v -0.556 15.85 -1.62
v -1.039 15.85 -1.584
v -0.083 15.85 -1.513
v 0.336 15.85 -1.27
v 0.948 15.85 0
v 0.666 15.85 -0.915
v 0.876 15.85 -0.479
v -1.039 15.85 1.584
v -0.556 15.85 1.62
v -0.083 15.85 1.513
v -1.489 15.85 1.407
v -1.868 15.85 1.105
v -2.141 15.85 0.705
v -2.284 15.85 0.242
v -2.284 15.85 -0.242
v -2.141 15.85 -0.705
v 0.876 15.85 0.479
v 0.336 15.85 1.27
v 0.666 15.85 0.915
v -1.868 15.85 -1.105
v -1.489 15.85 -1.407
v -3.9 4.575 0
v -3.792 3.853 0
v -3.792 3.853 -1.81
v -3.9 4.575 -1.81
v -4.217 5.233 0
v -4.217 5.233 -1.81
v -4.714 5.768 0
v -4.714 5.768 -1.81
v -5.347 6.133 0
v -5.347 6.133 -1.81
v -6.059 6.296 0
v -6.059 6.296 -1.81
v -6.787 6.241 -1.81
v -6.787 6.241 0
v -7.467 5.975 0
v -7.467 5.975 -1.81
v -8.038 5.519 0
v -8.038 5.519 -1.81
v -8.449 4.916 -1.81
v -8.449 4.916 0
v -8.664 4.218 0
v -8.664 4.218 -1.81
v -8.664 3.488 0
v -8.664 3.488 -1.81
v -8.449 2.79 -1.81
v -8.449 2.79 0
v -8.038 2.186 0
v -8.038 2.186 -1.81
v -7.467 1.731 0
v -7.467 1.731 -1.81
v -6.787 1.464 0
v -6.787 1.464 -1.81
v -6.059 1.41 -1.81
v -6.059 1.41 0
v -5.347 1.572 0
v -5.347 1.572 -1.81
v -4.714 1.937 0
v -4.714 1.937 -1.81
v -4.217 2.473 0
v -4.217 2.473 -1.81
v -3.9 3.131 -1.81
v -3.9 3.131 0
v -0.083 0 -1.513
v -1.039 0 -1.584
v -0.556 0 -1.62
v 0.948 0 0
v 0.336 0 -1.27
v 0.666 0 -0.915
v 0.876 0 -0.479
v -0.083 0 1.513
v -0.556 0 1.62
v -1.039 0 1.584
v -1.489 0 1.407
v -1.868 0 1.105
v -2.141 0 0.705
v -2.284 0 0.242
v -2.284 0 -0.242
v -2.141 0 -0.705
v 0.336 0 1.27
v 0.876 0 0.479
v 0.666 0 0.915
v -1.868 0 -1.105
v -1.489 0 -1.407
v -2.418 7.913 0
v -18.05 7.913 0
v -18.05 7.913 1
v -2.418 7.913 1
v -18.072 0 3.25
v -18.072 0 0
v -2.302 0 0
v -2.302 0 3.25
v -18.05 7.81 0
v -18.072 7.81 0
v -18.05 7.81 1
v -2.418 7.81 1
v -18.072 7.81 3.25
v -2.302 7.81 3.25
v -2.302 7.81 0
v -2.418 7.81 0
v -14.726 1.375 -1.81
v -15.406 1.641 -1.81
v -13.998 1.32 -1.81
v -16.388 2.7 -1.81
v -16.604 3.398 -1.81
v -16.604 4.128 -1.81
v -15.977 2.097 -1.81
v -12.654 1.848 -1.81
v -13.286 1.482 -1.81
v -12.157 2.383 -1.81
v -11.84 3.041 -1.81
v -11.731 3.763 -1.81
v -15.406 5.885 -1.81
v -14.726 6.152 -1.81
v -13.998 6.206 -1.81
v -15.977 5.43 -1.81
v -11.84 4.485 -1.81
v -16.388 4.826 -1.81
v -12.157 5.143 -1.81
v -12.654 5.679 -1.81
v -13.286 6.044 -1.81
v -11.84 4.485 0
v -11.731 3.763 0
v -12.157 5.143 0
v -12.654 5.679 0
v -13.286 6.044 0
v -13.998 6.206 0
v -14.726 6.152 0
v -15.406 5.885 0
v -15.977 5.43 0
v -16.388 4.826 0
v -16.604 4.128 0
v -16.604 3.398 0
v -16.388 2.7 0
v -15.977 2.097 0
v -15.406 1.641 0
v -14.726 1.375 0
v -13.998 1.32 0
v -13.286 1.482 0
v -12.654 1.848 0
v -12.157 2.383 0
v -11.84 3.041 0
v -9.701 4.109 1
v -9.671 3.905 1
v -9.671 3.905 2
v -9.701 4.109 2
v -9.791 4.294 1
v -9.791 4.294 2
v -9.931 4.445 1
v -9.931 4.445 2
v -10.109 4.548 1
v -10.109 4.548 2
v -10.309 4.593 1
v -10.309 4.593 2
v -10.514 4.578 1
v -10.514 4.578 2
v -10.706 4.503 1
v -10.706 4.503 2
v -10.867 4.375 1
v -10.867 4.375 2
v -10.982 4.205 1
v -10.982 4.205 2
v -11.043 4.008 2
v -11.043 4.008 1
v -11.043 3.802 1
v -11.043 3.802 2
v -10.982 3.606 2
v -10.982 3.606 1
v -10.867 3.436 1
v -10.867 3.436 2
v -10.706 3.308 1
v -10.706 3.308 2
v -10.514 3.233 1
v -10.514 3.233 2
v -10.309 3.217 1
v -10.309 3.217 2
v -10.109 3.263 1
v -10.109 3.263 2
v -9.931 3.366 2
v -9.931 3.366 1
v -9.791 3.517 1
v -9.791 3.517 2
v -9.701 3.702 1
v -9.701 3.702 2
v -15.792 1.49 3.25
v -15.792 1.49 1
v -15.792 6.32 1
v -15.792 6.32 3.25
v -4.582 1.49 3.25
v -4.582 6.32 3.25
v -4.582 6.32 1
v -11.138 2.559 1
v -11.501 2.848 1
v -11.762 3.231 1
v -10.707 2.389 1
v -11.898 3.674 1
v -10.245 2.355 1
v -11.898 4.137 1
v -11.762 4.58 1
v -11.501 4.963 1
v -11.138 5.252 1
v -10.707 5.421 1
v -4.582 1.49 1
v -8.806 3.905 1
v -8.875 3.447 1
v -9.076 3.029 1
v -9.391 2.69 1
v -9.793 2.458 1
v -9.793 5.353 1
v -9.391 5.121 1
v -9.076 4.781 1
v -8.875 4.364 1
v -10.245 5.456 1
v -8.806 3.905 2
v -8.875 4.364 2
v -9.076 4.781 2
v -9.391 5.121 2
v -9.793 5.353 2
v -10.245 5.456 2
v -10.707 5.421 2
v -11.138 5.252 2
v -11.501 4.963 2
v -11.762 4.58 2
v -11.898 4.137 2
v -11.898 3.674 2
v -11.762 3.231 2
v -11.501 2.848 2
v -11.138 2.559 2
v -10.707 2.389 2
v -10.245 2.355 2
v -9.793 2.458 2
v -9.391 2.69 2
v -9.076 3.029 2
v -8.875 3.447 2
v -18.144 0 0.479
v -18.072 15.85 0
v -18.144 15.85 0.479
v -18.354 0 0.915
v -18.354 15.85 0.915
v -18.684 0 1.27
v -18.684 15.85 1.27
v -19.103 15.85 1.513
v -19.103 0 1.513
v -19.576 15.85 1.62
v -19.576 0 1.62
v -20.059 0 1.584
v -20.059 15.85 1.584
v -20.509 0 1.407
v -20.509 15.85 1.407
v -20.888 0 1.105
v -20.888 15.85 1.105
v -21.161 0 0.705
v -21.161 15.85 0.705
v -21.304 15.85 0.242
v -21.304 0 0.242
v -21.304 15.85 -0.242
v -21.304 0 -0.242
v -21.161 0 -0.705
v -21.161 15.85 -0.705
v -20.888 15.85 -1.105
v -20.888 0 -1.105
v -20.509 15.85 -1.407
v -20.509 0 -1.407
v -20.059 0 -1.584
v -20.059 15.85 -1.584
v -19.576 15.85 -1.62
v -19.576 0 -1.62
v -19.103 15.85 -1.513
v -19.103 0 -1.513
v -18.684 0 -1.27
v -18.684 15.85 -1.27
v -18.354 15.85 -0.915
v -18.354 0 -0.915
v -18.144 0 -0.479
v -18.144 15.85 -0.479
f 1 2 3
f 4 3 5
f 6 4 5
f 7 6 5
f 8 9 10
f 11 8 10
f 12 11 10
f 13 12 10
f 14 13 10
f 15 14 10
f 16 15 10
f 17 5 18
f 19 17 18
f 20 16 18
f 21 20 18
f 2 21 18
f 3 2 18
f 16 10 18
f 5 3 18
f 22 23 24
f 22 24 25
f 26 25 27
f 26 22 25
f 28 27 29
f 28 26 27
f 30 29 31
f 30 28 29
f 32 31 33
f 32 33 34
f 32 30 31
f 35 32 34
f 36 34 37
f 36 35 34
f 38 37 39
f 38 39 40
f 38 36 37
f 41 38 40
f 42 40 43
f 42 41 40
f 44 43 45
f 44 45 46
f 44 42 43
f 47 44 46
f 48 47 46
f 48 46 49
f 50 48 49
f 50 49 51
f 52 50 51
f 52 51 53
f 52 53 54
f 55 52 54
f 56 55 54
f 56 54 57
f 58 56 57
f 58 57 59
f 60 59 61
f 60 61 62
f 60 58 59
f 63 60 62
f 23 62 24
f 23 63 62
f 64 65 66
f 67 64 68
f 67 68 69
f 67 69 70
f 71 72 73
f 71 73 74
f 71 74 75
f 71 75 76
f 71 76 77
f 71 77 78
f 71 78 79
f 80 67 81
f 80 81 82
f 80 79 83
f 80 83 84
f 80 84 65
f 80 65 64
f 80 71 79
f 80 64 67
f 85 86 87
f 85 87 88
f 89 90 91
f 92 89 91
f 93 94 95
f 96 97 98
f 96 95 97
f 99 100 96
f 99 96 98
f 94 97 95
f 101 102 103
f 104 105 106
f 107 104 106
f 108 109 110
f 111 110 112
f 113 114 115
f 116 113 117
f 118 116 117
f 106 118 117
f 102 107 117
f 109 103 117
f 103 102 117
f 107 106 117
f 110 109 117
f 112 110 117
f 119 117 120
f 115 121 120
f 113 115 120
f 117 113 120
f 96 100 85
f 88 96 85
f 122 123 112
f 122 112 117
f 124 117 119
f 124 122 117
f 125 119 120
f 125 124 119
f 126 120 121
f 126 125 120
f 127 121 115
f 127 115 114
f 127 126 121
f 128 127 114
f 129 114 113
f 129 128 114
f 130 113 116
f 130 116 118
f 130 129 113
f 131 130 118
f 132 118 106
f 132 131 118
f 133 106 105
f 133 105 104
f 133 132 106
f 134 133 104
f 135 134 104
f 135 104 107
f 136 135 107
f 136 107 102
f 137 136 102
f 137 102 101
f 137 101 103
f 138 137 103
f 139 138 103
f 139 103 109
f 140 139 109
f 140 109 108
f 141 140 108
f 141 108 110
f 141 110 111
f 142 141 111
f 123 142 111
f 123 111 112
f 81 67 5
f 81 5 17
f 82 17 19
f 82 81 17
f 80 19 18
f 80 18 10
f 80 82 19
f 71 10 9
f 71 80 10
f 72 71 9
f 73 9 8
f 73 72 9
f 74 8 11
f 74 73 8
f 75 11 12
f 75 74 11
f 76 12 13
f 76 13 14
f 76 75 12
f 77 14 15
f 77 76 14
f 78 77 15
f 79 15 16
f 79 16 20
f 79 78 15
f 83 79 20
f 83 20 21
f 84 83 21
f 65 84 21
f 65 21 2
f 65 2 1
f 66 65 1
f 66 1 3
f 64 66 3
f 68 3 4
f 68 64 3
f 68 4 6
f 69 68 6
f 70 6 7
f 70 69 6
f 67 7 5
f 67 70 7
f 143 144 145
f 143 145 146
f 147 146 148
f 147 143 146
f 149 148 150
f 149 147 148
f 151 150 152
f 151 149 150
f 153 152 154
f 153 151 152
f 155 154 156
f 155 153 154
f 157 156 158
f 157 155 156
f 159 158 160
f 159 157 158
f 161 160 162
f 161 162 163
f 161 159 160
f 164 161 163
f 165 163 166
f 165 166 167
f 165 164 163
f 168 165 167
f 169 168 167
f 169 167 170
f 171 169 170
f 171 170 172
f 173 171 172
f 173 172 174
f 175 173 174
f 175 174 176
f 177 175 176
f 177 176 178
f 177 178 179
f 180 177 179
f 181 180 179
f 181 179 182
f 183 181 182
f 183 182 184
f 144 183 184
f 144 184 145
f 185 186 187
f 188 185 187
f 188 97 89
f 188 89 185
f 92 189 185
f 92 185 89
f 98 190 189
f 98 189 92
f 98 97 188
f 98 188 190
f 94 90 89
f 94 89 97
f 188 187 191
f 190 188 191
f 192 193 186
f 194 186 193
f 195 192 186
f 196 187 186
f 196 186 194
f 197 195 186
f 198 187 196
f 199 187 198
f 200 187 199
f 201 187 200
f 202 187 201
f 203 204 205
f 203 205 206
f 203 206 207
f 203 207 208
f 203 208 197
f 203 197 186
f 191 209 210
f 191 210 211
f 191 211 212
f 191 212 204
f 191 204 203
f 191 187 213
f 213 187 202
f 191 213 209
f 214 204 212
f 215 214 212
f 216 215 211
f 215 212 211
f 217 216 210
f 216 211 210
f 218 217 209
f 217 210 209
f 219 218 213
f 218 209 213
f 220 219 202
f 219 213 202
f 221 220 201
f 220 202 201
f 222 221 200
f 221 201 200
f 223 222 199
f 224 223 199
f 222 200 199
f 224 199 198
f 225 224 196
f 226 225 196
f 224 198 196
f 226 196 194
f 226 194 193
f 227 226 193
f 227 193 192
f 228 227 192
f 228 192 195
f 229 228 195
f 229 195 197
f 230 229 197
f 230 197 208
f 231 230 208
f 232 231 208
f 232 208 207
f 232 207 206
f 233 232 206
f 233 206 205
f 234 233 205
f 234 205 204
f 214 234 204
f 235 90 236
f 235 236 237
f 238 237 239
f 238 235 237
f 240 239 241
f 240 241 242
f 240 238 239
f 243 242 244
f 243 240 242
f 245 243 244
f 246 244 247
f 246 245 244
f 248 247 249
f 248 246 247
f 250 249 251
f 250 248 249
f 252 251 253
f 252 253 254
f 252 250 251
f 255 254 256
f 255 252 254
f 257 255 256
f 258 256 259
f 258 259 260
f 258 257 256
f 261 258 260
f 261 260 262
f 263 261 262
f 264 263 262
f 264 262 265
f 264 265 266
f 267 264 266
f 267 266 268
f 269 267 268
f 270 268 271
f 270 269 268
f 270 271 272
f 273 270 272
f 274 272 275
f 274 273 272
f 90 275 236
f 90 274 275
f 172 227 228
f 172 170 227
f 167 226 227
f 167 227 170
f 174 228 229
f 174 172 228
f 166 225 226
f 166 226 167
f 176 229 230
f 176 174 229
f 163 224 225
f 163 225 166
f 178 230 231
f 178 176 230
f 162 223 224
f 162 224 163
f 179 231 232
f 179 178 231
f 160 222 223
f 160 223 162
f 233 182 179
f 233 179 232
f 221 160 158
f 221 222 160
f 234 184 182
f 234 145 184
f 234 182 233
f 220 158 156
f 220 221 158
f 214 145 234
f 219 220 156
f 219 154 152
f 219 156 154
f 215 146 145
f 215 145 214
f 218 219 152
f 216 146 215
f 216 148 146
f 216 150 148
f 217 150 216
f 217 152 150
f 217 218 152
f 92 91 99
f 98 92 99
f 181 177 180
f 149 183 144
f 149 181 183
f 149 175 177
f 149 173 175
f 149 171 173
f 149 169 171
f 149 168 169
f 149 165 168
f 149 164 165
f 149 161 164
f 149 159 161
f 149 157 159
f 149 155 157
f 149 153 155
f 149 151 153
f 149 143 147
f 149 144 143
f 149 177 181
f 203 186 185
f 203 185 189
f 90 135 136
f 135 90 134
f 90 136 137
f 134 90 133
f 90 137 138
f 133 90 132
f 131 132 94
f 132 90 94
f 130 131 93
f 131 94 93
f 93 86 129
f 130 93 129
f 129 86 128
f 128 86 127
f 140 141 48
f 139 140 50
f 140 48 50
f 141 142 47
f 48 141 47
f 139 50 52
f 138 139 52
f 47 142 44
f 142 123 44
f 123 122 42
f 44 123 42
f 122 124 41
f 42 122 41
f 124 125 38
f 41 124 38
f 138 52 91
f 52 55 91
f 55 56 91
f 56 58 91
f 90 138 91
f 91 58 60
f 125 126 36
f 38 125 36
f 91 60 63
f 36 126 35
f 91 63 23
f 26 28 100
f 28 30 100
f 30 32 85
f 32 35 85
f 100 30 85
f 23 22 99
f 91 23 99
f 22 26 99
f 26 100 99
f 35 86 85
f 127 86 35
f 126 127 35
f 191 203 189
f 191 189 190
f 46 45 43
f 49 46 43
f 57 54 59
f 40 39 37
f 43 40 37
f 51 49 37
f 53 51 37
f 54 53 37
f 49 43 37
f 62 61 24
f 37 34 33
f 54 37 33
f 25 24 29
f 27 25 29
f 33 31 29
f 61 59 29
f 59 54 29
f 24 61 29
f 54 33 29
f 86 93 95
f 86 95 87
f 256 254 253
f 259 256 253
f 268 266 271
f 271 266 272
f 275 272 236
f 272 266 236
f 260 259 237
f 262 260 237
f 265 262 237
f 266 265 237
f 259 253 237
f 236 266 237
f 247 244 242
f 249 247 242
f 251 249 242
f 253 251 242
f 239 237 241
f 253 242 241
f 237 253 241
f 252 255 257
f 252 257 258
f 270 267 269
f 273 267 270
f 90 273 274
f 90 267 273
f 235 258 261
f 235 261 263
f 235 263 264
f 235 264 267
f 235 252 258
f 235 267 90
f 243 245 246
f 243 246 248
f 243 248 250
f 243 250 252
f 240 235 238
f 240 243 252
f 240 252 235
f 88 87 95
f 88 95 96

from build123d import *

# Parameters (mm, degrees)
F0_W      = 15.77
F0_H      = 7.81
F1_DEPTH  = 3.25
F2_R      = 1.625
F3_DEPTH  = 15.85
F4_W      = 11.21
F4_H      = 4.83
F5_DEPTH  = 25
F6_W      = 15.632574
F6_H      = 7.912829
F7_DEPTH  = 1
F8_R      = 2.45
F9_DEPTH  = 1.81
F10_R     = 1.555
F10_R_2   = 0.69
F11_DEPTH = 2


with BuildPart() as f1:
    # F0 (on Top) → F1 (new body)
    with BuildSketch(Plane.XY):
        with Locations((-10.186976, 3.905)):
            Rectangle(F0_W, F0_H)
    extrude(amount=F1_DEPTH)

    # F4 (on Top) → F5 (cut)
    with BuildSketch(Plane.XY):
        with Locations((-10.186976, 3.905)):
            Rectangle(F4_W, F4_H)
    extrude(amount=F5_DEPTH, mode=Mode.SUBTRACT)

    # F6 (on Top) → F7 (join)
    with BuildSketch(Plane.XY):
        with Locations((-10.234115, 3.956414)):
            Rectangle(F6_W, F6_H)
    extrude(amount=F7_DEPTH)

    # F8 (on Top) → F9 (join)
    with BuildSketch(Plane.XY):
        with Locations((-14.181124, 3.763117)):
            Circle(F8_R)
        with Locations((-6.241631, 3.852829)):
            Circle(F8_R)
    extrude(amount=-F9_DEPTH)

    # F10 (on Top) → F11 (join)
    with BuildSketch(Plane.XY):
        with Locations((-10.360711, 3.905275)):
            Circle(F10_R)
        with Locations((-10.360711, 3.905275)):
            Circle(F10_R_2, mode=Mode.SUBTRACT)
    extrude(amount=F11_DEPTH)


with BuildPart() as f3:
    # F2 (on Front) → F3 (new body)
    with BuildSketch(Plane.XZ):
        with Locations((-19.696976, 0)):
            Circle(F2_R)
        with Locations((-0.676976, 0)):
            Circle(F2_R)
    extrude(amount=-F3_DEPTH)


solid = Compound([f1.part, f3.part])
